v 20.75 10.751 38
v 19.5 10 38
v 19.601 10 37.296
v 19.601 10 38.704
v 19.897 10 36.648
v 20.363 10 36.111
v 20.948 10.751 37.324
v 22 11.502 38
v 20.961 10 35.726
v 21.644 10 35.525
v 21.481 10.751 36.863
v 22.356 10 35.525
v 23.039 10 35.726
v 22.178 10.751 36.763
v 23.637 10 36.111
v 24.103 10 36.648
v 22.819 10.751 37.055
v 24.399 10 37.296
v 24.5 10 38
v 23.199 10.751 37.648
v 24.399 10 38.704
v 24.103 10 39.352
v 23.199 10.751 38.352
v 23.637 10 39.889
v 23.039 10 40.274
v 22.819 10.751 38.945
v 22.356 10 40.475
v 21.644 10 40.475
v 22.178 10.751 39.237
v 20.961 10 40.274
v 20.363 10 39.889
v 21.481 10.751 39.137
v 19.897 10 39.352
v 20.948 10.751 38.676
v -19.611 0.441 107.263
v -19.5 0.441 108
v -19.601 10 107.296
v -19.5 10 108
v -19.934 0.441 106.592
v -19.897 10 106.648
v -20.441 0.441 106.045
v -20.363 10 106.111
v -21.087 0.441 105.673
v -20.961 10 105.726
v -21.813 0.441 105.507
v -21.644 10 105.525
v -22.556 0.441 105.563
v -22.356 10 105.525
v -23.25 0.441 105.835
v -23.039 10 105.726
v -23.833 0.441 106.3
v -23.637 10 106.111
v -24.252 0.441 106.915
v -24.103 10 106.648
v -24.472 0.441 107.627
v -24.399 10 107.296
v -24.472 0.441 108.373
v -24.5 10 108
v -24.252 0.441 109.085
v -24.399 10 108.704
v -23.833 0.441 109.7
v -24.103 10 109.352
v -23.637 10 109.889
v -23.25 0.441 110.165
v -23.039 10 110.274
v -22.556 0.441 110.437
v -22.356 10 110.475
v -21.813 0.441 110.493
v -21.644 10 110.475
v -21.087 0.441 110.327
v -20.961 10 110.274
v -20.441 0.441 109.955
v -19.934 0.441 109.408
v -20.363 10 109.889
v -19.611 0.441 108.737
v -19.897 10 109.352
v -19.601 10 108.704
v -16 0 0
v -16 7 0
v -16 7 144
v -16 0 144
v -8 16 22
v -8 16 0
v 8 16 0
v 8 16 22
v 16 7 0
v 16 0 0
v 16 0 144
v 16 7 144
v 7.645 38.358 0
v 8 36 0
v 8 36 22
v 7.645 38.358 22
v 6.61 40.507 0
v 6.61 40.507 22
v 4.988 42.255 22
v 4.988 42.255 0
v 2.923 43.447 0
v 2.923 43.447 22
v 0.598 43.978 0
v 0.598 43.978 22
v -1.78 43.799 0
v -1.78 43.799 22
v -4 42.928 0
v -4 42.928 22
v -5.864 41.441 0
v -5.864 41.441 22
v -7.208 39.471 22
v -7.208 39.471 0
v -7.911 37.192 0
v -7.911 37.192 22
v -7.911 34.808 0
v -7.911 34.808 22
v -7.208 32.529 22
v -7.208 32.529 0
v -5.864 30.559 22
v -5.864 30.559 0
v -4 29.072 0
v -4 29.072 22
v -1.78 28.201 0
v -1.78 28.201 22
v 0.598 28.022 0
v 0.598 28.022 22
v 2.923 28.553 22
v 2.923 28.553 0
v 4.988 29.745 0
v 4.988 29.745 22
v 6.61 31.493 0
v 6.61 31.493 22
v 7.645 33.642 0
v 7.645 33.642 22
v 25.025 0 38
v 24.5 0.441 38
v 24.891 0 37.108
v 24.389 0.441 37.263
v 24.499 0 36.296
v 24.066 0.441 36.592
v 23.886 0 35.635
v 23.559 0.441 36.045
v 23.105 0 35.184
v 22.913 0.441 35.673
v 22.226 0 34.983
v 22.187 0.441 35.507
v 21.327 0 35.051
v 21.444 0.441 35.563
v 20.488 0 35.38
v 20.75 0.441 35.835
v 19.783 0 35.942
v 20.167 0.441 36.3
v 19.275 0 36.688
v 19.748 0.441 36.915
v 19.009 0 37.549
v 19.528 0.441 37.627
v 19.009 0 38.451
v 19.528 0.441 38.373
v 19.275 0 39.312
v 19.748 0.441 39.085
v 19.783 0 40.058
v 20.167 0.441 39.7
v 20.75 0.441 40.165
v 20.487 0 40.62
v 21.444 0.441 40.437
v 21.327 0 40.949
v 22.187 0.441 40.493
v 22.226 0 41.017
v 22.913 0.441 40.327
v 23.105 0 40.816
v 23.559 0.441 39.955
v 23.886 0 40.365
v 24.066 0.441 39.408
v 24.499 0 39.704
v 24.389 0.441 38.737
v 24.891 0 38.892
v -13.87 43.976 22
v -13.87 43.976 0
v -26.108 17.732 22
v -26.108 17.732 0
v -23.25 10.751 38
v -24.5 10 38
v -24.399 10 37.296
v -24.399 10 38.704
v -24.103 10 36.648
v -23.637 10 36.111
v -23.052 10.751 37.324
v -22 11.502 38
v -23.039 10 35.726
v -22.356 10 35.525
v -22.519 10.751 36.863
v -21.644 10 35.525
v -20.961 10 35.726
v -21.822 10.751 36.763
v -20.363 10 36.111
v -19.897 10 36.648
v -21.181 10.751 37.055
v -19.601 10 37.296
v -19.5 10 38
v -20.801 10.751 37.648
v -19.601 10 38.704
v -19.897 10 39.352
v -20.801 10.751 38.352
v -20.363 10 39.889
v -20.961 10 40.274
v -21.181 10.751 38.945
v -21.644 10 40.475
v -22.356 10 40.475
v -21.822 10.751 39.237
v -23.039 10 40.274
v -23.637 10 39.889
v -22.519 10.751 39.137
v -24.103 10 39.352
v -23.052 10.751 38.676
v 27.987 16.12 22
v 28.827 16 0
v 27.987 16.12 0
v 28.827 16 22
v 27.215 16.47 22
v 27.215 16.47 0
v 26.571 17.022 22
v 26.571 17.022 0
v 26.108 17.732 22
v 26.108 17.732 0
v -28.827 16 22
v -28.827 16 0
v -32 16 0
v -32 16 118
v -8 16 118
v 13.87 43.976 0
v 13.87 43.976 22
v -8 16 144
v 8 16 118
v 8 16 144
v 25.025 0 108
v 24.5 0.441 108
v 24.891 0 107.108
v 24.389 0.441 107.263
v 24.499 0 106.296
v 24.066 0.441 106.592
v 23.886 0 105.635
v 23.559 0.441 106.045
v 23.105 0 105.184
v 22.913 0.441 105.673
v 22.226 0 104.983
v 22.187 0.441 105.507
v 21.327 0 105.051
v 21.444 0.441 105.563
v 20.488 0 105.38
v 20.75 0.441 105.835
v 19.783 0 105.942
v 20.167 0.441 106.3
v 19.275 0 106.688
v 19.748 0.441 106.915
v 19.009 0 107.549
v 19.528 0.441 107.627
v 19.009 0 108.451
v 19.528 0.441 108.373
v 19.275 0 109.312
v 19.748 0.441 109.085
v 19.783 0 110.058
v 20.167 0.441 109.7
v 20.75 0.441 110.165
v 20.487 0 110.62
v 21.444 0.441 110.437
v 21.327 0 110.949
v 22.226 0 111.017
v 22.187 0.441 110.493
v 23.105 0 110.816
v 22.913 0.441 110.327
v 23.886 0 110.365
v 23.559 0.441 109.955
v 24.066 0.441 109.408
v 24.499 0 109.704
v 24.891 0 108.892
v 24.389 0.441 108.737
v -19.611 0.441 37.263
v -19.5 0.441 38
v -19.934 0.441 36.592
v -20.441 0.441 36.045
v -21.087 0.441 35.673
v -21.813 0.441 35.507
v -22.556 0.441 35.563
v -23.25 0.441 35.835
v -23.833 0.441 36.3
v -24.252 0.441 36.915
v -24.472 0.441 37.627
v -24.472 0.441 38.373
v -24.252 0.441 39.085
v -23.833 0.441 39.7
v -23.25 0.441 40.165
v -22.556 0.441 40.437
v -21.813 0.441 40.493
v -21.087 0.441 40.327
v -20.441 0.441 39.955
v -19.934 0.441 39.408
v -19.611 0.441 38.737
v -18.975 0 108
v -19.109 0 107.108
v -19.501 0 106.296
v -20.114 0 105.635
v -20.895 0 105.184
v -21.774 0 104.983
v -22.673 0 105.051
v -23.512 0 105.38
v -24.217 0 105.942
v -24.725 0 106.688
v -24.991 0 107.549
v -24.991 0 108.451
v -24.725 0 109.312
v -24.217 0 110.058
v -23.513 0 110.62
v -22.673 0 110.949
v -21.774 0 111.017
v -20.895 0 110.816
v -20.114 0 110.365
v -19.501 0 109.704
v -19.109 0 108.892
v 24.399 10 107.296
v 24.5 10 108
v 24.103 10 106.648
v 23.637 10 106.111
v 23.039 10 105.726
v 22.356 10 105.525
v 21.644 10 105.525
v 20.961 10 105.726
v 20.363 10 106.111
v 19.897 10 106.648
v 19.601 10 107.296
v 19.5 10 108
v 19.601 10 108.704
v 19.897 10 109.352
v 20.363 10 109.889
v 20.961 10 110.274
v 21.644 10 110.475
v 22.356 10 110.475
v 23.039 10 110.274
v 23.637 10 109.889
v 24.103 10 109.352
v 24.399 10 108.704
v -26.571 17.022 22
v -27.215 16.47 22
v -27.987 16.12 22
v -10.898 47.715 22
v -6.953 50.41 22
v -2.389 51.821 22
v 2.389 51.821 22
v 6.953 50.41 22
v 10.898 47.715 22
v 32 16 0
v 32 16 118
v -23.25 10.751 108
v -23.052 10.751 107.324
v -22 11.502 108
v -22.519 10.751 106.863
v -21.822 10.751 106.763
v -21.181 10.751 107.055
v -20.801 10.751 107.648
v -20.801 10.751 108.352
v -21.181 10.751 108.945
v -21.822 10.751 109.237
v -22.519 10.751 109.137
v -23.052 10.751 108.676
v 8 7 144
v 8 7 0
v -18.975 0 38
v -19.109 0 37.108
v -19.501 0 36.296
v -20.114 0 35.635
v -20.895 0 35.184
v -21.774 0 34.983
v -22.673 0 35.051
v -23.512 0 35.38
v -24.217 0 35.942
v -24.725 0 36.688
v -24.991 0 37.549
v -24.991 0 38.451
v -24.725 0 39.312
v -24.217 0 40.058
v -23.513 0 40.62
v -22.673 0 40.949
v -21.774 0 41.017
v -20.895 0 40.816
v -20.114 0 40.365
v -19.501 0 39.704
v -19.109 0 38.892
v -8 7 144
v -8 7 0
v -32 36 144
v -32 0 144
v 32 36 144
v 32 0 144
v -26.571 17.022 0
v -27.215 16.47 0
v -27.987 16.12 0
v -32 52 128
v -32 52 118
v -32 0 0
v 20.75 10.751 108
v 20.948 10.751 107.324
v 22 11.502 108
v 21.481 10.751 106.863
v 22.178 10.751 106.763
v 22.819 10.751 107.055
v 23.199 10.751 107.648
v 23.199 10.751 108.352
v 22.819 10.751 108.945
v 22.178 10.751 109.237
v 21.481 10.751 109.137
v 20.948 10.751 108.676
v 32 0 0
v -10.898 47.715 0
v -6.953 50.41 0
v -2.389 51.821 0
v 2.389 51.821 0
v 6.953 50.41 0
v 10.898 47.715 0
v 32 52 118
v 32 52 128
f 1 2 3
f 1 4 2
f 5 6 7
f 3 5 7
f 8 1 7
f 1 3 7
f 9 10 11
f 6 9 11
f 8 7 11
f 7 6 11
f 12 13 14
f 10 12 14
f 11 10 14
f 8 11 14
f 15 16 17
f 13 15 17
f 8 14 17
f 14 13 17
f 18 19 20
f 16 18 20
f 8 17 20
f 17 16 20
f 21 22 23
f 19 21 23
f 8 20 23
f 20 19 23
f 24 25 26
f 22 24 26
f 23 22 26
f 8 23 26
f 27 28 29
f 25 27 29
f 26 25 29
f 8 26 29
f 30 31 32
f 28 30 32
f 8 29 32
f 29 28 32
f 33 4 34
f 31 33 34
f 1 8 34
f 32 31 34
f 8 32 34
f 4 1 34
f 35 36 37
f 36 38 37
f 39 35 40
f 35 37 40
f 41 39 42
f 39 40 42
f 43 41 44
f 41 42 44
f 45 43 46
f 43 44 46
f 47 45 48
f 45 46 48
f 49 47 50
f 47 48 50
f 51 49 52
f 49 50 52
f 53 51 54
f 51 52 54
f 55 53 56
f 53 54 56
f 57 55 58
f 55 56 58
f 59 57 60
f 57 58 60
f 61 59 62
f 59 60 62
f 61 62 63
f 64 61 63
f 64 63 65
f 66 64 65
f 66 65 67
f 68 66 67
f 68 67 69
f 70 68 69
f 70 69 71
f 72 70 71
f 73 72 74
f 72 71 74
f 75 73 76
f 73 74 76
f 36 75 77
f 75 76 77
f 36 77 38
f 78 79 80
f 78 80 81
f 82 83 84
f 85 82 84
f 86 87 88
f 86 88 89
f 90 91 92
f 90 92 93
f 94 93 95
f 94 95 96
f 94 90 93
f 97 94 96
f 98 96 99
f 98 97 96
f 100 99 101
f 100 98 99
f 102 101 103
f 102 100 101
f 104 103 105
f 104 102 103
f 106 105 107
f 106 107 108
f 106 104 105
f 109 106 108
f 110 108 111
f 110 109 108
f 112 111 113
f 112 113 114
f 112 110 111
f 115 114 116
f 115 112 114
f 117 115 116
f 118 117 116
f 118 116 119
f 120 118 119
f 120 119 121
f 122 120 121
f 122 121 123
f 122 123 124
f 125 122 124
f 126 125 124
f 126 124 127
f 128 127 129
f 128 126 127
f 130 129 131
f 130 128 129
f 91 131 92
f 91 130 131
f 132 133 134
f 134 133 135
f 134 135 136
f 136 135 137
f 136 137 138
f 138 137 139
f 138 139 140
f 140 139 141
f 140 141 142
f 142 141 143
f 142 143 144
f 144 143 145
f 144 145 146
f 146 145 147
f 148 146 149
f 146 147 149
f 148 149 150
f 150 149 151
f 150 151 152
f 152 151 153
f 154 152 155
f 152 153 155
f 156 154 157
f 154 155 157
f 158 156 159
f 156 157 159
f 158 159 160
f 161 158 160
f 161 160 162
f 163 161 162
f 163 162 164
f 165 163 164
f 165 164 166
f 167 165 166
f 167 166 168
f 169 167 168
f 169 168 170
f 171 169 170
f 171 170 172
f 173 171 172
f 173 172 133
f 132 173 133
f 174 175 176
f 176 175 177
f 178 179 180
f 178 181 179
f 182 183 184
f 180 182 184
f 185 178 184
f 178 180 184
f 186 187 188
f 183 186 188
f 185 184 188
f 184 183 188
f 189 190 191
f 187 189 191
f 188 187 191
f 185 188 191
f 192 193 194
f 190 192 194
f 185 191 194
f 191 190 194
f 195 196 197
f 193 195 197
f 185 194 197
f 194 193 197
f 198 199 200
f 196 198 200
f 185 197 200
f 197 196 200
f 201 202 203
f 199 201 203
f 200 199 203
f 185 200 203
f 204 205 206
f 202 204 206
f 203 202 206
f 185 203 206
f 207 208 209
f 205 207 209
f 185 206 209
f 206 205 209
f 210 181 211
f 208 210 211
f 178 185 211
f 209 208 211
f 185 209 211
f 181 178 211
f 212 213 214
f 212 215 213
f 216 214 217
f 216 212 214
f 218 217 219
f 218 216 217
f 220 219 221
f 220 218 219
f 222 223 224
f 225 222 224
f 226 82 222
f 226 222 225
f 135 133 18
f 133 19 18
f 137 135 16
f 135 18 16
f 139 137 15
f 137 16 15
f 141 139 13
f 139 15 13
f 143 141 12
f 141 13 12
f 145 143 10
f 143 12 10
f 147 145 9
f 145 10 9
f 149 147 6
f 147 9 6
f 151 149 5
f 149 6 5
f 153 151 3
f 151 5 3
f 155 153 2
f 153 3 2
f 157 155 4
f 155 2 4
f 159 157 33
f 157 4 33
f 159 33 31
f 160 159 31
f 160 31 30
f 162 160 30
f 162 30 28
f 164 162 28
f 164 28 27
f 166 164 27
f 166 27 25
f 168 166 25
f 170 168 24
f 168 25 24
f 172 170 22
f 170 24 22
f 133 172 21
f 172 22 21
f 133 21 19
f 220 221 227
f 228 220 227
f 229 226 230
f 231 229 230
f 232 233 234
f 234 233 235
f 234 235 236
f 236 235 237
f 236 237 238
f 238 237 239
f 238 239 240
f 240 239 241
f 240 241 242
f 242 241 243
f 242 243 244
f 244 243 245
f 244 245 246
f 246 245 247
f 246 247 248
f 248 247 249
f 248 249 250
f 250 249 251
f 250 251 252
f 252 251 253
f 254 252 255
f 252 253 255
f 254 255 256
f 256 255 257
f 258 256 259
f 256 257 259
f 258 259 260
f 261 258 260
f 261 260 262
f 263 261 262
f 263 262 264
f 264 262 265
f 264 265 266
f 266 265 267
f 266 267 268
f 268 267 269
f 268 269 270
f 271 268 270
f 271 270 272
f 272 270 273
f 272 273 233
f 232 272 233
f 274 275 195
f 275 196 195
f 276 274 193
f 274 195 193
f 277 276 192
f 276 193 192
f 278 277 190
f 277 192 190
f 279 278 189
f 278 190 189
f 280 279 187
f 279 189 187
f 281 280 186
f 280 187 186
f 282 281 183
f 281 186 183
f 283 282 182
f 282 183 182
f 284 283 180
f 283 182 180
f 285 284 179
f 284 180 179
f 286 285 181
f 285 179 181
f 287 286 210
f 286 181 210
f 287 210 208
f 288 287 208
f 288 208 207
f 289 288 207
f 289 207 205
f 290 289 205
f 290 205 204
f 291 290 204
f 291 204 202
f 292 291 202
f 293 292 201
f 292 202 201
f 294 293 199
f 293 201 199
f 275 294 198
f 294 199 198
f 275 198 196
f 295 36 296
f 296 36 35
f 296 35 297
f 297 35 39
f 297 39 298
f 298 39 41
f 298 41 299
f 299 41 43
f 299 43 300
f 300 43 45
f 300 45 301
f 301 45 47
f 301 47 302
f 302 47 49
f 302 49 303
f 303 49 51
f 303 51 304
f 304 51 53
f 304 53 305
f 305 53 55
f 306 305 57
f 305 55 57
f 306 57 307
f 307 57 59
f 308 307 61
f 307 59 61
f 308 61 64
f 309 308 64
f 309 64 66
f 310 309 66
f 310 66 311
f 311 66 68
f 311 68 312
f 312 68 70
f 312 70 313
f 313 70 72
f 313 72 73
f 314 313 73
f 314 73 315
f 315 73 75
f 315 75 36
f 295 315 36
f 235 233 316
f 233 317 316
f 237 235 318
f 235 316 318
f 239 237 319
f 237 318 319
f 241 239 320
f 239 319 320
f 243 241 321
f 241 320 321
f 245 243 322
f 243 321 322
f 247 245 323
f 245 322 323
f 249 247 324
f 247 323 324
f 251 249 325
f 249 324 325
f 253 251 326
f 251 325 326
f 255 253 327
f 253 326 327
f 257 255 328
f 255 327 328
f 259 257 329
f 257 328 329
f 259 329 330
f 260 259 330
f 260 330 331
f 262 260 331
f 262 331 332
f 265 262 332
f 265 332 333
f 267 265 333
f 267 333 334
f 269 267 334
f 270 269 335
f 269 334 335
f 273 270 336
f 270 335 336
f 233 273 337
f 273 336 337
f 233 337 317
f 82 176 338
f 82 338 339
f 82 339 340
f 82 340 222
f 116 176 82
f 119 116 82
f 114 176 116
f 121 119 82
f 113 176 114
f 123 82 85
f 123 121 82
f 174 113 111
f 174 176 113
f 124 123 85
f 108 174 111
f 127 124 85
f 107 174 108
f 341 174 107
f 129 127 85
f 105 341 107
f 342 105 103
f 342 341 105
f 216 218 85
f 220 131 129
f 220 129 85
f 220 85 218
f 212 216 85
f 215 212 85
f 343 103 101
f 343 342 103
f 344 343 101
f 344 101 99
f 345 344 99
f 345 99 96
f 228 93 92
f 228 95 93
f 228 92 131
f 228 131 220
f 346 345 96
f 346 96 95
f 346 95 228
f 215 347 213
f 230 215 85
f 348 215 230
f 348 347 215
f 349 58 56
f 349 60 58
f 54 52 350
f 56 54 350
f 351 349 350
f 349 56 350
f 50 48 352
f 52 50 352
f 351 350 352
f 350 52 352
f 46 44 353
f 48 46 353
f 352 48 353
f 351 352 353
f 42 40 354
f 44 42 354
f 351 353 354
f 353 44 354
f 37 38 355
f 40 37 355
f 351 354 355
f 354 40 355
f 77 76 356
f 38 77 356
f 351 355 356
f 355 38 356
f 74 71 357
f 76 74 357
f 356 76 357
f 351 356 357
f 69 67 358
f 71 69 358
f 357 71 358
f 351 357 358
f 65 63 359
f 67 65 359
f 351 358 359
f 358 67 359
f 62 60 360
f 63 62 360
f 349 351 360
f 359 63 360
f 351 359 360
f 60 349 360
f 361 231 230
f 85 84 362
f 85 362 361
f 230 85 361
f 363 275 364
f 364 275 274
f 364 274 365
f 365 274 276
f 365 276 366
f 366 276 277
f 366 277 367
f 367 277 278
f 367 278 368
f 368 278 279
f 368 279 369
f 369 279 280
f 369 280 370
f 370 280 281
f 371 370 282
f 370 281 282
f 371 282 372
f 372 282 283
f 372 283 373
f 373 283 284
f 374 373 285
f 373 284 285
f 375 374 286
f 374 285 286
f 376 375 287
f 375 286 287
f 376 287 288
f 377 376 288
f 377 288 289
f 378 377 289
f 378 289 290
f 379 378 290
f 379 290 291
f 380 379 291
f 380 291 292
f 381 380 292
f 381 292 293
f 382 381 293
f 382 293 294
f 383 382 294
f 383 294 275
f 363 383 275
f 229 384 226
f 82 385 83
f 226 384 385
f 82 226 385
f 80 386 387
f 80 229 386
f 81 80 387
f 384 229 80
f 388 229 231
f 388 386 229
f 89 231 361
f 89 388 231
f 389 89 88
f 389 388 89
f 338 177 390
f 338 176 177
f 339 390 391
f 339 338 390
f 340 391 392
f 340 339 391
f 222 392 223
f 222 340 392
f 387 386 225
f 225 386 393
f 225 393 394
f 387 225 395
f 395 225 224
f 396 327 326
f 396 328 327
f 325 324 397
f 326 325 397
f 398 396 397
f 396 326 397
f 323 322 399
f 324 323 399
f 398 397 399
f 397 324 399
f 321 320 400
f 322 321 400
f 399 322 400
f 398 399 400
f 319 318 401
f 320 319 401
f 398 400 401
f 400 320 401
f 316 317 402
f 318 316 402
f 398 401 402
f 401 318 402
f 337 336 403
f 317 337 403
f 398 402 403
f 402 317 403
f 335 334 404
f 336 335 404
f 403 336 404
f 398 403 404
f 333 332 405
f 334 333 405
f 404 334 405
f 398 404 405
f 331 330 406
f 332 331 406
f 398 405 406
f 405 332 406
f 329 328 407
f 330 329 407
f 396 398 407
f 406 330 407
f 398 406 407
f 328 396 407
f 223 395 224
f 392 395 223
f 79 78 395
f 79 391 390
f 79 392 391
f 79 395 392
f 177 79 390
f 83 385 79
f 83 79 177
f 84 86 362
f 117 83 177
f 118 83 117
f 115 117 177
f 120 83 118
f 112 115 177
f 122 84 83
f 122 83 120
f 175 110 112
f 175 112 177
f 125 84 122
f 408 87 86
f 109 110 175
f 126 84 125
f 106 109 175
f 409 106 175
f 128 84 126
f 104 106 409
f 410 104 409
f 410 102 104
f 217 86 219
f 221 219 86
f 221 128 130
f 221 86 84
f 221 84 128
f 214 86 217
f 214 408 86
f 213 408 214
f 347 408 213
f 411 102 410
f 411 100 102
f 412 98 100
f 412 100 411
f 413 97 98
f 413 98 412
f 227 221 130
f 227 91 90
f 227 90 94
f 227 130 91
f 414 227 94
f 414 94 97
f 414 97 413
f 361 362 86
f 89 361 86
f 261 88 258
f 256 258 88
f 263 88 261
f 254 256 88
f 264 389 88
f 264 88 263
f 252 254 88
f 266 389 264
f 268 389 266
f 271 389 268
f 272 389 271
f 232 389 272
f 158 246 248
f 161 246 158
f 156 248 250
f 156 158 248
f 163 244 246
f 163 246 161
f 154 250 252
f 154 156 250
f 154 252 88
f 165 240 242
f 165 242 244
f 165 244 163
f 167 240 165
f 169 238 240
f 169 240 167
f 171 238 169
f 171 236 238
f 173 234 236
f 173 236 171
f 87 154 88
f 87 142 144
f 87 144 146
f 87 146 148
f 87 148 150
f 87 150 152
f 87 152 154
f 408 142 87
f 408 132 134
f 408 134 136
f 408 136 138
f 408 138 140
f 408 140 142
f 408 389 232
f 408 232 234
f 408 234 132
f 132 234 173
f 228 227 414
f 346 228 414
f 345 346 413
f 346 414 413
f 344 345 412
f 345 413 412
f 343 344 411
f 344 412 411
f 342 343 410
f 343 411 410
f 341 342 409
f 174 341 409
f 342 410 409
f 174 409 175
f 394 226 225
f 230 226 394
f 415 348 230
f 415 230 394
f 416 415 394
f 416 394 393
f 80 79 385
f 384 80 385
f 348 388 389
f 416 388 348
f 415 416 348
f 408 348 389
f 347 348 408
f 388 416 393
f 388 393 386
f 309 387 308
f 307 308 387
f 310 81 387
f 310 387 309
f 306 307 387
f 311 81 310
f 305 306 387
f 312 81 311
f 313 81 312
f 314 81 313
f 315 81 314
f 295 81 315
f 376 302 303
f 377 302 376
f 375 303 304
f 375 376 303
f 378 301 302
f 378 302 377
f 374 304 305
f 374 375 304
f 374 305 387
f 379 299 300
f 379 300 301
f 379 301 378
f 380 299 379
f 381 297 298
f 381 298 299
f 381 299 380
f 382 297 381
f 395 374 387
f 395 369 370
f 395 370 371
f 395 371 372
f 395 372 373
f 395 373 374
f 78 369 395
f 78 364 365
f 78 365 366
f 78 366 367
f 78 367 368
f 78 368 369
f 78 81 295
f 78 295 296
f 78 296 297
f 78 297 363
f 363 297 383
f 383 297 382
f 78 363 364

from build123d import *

# Parameters (mm, degrees)
BOSS_EXTRUDE1_DEPTH             = 32
SKETCH3_R                       = 8
BOSS_EXTRUDE2_DEPTH             = 22
M6X1_0_TAPPED_HOLE2_D           = 5
M6X1_0_TAPPED_HOLE2_DEPTH       = 10
M6X1_0_TAPPED_HOLE2_CSINK_D     = 6.05
M6X1_0_TAPPED_HOLE2_CSINK_ANGLE = 100
M6X1_0_TAPPED_HOLE2_TIP         = 1.502151548
CUT_EXTRUDE3_DEPTH              = 157.409718368
FILLET1_R                       = 3


with BuildPart() as part:
    # Sketch1 → Boss-Extrude1 (new, symmetric)
    with BuildSketch(Plane(origin=(0, 0, 0), x_dir=(0, 0, -1), z_dir=(1, 0, 0))):
        Polygon((0, 0), (0, 16), (-118, 16), (-118, 52), (-128, 52), (-144, 36), (-144, 0), align=None)
    extrude(amount=BOSS_EXTRUDE1_DEPTH, both=True)

    # Sketch3 → Boss-Extrude2 (add)
    with BuildSketch(Plane.XY):
        with BuildLine():
            Line((26.915706543, 16), (13.870490741, 43.975555567))
            ThreePointArc((13.870490741, 43.975555567), (0, 52), (-13.870490741, 43.975555567))
            Line((-13.870490741, 43.975555567), (-26.915706543, 16))
            Line((-26.915706543, 16), (26.915706543, 16))
        make_face()
        with Locations((0, 36)):
            Circle(SKETCH3_R, mode=Mode.SUBTRACT)
    extrude(amount=BOSS_EXTRUDE2_DEPTH)

    # M6x1.0 Tapped Hole2
    with Locations(Plane(origin=(0, 0, 0), x_dir=(-1, 0, 0), z_dir=(0, -1, 0))):
        with Locations((22, -38), (22, -108), (-22, -108), (-22, -38)):
            CounterSinkHole(M6X1_0_TAPPED_HOLE2_D / 2, M6X1_0_TAPPED_HOLE2_CSINK_D / 2, depth=M6X1_0_TAPPED_HOLE2_DEPTH, counter_sink_angle=M6X1_0_TAPPED_HOLE2_CSINK_ANGLE)
            with Locations((0, 0, -(M6X1_0_TAPPED_HOLE2_DEPTH + M6X1_0_TAPPED_HOLE2_TIP / 2))):  # 118° drill point
                Cone(0, M6X1_0_TAPPED_HOLE2_D / 2, M6X1_0_TAPPED_HOLE2_TIP, mode=Mode.SUBTRACT)

    # Sketch11 → Cut-Extrude3 (cut, through all)
    with BuildSketch(Plane.XY):
        Polygon((-16, 0), (-16, 7), (-8, 7), (-8, 16), (8, 16), (8, 7), (16, 7), (16, 0), (16, -2.333902057), (-16, -2.333902057), align=None)
    extrude(amount=CUT_EXTRUDE3_DEPTH, mode=Mode.SUBTRACT)

    # Fillet1
    fillet1_edges = [part.edges().sort_by_distance(p)[0] for p in [
        (-26.915706543, 16, 11),
        (26.915706543, 16, 11),
    ]]
    fillet(fillet1_edges, radius=FILLET1_R)


solid = part.part
